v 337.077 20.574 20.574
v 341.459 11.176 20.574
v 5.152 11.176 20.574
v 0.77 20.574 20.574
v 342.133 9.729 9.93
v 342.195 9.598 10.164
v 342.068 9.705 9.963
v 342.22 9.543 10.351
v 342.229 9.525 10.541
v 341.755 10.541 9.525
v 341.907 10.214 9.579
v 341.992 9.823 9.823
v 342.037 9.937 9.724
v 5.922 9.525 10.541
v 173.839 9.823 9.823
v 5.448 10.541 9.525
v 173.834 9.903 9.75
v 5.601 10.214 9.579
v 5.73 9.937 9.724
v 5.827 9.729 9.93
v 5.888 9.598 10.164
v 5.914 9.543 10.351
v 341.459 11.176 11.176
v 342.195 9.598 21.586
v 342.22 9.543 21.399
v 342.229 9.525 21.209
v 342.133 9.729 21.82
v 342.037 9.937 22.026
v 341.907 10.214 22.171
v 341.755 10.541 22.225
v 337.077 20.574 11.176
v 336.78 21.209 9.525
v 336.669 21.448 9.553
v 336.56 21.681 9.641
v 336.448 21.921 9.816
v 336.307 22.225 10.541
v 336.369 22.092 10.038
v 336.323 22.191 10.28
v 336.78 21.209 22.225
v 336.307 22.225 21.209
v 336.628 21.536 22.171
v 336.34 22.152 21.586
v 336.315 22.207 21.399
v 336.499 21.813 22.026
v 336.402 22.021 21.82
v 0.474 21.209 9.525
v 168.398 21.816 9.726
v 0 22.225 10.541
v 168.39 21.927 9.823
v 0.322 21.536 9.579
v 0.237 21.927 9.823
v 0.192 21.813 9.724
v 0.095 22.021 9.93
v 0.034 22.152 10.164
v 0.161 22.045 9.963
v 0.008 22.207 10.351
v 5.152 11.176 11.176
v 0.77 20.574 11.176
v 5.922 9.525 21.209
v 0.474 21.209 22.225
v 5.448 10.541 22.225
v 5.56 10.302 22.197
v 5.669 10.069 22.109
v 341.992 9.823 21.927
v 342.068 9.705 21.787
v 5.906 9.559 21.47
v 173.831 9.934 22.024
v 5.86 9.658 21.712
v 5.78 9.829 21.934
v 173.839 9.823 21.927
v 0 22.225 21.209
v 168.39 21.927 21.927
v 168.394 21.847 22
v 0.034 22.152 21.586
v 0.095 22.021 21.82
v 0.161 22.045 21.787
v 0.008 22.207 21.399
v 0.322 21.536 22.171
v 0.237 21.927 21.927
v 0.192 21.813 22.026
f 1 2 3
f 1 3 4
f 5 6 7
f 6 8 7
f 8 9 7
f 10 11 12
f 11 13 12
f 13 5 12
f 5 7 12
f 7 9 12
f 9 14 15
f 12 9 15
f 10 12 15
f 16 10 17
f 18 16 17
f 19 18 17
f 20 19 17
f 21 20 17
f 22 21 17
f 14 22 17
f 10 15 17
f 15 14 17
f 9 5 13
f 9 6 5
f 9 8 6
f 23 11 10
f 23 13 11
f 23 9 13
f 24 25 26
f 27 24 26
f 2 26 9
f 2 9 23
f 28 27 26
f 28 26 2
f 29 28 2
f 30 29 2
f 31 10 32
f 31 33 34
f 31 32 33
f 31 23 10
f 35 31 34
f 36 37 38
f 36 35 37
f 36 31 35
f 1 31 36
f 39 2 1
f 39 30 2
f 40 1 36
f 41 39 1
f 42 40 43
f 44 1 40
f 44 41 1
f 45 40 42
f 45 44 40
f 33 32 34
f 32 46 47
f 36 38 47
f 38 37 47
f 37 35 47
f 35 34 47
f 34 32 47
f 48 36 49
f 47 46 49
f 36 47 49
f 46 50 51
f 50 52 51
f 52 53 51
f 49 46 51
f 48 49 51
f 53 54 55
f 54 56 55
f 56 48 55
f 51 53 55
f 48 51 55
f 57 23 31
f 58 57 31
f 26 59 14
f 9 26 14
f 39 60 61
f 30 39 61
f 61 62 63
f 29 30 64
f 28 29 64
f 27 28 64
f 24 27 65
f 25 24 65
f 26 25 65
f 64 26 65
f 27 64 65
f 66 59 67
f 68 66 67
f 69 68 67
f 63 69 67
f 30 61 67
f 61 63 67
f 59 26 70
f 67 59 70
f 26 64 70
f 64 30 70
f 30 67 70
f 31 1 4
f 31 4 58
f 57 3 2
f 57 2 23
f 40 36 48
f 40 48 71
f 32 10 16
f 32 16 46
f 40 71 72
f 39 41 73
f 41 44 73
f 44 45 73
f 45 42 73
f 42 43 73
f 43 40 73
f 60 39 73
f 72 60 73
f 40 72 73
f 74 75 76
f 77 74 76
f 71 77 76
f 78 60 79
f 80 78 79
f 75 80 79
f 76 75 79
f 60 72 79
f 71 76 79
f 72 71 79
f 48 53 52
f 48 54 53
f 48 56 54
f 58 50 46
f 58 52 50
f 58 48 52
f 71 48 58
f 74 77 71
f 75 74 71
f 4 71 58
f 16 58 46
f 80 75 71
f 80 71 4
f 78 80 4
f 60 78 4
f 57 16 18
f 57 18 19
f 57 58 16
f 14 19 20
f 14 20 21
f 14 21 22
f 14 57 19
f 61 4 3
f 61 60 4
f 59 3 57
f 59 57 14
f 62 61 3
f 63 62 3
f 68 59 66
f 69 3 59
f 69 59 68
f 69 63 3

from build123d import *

# Parameters (mm, degrees)
SKETCH1_W           = 23.495
SKETCH1_H           = 23.495
BOSS_EXTRUDE1_DEPTH = 342.22874176
SCALE1_SCALE_X      = 1
SCALE1_SCALE_Y      = 0.4
SCALE1_SCALE_Z      = 0.4
CUT_EXTRUDE1_DEPTH  = 344.184720504


with BuildPart() as part:
    # Sketch1 → Boss-Extrude1 (new body)
    with BuildSketch(Plane(origin=(0, 0, 0), x_dir=(0, 0, -1), z_dir=(1, 0, 0))):
        with BuildLine():
            Line((0, 2.54), (0, 29.21))
            ThreePointArc((0, 29.21), (-0.743948776, 31.006051224), (-2.54, 31.75))
            Line((-2.54, 31.75), (-29.21, 31.75))
            ThreePointArc((-29.21, 31.75), (-31.006051224, 31.006051224), (-31.75, 29.21))
            Line((-31.75, 29.21), (-31.75, 2.54))
            ThreePointArc((-31.75, 2.54), (-31.006051224, 0.743948776), (-29.21, 0))
            Line((-29.21, 0), (-2.54, 0))
            ThreePointArc((-2.54, 0), (-0.743948776, 0.743948776), (0, 2.54))
        make_face()
        with Locations((-15.875, 15.875)):
            Rectangle(SKETCH1_W, SKETCH1_H, mode=Mode.SUBTRACT)
    extrude(amount=BOSS_EXTRUDE1_DEPTH)


with BuildPart() as part_1:
    # Scale1: scaled about (171.11437088, 15.875, 15.875)
    add(part.part.scale((SCALE1_SCALE_X, SCALE1_SCALE_Y, SCALE1_SCALE_Z), about=(171.11437088, 15.875, 15.875)))

    # Sketch2 → Cut-Extrude1 (cut, through all)
    with BuildSketch(Plane.XY.offset(22.225)):
        Polygon((342.22874176, 9.525), (336.306634502, 22.225), (342.22874176, 22.225), align=None)
        Polygon((0, 9.525), (0, 22.225), (5.922107259, 9.525), align=None)
    extrude(amount=-CUT_EXTRUDE1_DEPTH, mode=Mode.SUBTRACT)


solid = part_1.part
